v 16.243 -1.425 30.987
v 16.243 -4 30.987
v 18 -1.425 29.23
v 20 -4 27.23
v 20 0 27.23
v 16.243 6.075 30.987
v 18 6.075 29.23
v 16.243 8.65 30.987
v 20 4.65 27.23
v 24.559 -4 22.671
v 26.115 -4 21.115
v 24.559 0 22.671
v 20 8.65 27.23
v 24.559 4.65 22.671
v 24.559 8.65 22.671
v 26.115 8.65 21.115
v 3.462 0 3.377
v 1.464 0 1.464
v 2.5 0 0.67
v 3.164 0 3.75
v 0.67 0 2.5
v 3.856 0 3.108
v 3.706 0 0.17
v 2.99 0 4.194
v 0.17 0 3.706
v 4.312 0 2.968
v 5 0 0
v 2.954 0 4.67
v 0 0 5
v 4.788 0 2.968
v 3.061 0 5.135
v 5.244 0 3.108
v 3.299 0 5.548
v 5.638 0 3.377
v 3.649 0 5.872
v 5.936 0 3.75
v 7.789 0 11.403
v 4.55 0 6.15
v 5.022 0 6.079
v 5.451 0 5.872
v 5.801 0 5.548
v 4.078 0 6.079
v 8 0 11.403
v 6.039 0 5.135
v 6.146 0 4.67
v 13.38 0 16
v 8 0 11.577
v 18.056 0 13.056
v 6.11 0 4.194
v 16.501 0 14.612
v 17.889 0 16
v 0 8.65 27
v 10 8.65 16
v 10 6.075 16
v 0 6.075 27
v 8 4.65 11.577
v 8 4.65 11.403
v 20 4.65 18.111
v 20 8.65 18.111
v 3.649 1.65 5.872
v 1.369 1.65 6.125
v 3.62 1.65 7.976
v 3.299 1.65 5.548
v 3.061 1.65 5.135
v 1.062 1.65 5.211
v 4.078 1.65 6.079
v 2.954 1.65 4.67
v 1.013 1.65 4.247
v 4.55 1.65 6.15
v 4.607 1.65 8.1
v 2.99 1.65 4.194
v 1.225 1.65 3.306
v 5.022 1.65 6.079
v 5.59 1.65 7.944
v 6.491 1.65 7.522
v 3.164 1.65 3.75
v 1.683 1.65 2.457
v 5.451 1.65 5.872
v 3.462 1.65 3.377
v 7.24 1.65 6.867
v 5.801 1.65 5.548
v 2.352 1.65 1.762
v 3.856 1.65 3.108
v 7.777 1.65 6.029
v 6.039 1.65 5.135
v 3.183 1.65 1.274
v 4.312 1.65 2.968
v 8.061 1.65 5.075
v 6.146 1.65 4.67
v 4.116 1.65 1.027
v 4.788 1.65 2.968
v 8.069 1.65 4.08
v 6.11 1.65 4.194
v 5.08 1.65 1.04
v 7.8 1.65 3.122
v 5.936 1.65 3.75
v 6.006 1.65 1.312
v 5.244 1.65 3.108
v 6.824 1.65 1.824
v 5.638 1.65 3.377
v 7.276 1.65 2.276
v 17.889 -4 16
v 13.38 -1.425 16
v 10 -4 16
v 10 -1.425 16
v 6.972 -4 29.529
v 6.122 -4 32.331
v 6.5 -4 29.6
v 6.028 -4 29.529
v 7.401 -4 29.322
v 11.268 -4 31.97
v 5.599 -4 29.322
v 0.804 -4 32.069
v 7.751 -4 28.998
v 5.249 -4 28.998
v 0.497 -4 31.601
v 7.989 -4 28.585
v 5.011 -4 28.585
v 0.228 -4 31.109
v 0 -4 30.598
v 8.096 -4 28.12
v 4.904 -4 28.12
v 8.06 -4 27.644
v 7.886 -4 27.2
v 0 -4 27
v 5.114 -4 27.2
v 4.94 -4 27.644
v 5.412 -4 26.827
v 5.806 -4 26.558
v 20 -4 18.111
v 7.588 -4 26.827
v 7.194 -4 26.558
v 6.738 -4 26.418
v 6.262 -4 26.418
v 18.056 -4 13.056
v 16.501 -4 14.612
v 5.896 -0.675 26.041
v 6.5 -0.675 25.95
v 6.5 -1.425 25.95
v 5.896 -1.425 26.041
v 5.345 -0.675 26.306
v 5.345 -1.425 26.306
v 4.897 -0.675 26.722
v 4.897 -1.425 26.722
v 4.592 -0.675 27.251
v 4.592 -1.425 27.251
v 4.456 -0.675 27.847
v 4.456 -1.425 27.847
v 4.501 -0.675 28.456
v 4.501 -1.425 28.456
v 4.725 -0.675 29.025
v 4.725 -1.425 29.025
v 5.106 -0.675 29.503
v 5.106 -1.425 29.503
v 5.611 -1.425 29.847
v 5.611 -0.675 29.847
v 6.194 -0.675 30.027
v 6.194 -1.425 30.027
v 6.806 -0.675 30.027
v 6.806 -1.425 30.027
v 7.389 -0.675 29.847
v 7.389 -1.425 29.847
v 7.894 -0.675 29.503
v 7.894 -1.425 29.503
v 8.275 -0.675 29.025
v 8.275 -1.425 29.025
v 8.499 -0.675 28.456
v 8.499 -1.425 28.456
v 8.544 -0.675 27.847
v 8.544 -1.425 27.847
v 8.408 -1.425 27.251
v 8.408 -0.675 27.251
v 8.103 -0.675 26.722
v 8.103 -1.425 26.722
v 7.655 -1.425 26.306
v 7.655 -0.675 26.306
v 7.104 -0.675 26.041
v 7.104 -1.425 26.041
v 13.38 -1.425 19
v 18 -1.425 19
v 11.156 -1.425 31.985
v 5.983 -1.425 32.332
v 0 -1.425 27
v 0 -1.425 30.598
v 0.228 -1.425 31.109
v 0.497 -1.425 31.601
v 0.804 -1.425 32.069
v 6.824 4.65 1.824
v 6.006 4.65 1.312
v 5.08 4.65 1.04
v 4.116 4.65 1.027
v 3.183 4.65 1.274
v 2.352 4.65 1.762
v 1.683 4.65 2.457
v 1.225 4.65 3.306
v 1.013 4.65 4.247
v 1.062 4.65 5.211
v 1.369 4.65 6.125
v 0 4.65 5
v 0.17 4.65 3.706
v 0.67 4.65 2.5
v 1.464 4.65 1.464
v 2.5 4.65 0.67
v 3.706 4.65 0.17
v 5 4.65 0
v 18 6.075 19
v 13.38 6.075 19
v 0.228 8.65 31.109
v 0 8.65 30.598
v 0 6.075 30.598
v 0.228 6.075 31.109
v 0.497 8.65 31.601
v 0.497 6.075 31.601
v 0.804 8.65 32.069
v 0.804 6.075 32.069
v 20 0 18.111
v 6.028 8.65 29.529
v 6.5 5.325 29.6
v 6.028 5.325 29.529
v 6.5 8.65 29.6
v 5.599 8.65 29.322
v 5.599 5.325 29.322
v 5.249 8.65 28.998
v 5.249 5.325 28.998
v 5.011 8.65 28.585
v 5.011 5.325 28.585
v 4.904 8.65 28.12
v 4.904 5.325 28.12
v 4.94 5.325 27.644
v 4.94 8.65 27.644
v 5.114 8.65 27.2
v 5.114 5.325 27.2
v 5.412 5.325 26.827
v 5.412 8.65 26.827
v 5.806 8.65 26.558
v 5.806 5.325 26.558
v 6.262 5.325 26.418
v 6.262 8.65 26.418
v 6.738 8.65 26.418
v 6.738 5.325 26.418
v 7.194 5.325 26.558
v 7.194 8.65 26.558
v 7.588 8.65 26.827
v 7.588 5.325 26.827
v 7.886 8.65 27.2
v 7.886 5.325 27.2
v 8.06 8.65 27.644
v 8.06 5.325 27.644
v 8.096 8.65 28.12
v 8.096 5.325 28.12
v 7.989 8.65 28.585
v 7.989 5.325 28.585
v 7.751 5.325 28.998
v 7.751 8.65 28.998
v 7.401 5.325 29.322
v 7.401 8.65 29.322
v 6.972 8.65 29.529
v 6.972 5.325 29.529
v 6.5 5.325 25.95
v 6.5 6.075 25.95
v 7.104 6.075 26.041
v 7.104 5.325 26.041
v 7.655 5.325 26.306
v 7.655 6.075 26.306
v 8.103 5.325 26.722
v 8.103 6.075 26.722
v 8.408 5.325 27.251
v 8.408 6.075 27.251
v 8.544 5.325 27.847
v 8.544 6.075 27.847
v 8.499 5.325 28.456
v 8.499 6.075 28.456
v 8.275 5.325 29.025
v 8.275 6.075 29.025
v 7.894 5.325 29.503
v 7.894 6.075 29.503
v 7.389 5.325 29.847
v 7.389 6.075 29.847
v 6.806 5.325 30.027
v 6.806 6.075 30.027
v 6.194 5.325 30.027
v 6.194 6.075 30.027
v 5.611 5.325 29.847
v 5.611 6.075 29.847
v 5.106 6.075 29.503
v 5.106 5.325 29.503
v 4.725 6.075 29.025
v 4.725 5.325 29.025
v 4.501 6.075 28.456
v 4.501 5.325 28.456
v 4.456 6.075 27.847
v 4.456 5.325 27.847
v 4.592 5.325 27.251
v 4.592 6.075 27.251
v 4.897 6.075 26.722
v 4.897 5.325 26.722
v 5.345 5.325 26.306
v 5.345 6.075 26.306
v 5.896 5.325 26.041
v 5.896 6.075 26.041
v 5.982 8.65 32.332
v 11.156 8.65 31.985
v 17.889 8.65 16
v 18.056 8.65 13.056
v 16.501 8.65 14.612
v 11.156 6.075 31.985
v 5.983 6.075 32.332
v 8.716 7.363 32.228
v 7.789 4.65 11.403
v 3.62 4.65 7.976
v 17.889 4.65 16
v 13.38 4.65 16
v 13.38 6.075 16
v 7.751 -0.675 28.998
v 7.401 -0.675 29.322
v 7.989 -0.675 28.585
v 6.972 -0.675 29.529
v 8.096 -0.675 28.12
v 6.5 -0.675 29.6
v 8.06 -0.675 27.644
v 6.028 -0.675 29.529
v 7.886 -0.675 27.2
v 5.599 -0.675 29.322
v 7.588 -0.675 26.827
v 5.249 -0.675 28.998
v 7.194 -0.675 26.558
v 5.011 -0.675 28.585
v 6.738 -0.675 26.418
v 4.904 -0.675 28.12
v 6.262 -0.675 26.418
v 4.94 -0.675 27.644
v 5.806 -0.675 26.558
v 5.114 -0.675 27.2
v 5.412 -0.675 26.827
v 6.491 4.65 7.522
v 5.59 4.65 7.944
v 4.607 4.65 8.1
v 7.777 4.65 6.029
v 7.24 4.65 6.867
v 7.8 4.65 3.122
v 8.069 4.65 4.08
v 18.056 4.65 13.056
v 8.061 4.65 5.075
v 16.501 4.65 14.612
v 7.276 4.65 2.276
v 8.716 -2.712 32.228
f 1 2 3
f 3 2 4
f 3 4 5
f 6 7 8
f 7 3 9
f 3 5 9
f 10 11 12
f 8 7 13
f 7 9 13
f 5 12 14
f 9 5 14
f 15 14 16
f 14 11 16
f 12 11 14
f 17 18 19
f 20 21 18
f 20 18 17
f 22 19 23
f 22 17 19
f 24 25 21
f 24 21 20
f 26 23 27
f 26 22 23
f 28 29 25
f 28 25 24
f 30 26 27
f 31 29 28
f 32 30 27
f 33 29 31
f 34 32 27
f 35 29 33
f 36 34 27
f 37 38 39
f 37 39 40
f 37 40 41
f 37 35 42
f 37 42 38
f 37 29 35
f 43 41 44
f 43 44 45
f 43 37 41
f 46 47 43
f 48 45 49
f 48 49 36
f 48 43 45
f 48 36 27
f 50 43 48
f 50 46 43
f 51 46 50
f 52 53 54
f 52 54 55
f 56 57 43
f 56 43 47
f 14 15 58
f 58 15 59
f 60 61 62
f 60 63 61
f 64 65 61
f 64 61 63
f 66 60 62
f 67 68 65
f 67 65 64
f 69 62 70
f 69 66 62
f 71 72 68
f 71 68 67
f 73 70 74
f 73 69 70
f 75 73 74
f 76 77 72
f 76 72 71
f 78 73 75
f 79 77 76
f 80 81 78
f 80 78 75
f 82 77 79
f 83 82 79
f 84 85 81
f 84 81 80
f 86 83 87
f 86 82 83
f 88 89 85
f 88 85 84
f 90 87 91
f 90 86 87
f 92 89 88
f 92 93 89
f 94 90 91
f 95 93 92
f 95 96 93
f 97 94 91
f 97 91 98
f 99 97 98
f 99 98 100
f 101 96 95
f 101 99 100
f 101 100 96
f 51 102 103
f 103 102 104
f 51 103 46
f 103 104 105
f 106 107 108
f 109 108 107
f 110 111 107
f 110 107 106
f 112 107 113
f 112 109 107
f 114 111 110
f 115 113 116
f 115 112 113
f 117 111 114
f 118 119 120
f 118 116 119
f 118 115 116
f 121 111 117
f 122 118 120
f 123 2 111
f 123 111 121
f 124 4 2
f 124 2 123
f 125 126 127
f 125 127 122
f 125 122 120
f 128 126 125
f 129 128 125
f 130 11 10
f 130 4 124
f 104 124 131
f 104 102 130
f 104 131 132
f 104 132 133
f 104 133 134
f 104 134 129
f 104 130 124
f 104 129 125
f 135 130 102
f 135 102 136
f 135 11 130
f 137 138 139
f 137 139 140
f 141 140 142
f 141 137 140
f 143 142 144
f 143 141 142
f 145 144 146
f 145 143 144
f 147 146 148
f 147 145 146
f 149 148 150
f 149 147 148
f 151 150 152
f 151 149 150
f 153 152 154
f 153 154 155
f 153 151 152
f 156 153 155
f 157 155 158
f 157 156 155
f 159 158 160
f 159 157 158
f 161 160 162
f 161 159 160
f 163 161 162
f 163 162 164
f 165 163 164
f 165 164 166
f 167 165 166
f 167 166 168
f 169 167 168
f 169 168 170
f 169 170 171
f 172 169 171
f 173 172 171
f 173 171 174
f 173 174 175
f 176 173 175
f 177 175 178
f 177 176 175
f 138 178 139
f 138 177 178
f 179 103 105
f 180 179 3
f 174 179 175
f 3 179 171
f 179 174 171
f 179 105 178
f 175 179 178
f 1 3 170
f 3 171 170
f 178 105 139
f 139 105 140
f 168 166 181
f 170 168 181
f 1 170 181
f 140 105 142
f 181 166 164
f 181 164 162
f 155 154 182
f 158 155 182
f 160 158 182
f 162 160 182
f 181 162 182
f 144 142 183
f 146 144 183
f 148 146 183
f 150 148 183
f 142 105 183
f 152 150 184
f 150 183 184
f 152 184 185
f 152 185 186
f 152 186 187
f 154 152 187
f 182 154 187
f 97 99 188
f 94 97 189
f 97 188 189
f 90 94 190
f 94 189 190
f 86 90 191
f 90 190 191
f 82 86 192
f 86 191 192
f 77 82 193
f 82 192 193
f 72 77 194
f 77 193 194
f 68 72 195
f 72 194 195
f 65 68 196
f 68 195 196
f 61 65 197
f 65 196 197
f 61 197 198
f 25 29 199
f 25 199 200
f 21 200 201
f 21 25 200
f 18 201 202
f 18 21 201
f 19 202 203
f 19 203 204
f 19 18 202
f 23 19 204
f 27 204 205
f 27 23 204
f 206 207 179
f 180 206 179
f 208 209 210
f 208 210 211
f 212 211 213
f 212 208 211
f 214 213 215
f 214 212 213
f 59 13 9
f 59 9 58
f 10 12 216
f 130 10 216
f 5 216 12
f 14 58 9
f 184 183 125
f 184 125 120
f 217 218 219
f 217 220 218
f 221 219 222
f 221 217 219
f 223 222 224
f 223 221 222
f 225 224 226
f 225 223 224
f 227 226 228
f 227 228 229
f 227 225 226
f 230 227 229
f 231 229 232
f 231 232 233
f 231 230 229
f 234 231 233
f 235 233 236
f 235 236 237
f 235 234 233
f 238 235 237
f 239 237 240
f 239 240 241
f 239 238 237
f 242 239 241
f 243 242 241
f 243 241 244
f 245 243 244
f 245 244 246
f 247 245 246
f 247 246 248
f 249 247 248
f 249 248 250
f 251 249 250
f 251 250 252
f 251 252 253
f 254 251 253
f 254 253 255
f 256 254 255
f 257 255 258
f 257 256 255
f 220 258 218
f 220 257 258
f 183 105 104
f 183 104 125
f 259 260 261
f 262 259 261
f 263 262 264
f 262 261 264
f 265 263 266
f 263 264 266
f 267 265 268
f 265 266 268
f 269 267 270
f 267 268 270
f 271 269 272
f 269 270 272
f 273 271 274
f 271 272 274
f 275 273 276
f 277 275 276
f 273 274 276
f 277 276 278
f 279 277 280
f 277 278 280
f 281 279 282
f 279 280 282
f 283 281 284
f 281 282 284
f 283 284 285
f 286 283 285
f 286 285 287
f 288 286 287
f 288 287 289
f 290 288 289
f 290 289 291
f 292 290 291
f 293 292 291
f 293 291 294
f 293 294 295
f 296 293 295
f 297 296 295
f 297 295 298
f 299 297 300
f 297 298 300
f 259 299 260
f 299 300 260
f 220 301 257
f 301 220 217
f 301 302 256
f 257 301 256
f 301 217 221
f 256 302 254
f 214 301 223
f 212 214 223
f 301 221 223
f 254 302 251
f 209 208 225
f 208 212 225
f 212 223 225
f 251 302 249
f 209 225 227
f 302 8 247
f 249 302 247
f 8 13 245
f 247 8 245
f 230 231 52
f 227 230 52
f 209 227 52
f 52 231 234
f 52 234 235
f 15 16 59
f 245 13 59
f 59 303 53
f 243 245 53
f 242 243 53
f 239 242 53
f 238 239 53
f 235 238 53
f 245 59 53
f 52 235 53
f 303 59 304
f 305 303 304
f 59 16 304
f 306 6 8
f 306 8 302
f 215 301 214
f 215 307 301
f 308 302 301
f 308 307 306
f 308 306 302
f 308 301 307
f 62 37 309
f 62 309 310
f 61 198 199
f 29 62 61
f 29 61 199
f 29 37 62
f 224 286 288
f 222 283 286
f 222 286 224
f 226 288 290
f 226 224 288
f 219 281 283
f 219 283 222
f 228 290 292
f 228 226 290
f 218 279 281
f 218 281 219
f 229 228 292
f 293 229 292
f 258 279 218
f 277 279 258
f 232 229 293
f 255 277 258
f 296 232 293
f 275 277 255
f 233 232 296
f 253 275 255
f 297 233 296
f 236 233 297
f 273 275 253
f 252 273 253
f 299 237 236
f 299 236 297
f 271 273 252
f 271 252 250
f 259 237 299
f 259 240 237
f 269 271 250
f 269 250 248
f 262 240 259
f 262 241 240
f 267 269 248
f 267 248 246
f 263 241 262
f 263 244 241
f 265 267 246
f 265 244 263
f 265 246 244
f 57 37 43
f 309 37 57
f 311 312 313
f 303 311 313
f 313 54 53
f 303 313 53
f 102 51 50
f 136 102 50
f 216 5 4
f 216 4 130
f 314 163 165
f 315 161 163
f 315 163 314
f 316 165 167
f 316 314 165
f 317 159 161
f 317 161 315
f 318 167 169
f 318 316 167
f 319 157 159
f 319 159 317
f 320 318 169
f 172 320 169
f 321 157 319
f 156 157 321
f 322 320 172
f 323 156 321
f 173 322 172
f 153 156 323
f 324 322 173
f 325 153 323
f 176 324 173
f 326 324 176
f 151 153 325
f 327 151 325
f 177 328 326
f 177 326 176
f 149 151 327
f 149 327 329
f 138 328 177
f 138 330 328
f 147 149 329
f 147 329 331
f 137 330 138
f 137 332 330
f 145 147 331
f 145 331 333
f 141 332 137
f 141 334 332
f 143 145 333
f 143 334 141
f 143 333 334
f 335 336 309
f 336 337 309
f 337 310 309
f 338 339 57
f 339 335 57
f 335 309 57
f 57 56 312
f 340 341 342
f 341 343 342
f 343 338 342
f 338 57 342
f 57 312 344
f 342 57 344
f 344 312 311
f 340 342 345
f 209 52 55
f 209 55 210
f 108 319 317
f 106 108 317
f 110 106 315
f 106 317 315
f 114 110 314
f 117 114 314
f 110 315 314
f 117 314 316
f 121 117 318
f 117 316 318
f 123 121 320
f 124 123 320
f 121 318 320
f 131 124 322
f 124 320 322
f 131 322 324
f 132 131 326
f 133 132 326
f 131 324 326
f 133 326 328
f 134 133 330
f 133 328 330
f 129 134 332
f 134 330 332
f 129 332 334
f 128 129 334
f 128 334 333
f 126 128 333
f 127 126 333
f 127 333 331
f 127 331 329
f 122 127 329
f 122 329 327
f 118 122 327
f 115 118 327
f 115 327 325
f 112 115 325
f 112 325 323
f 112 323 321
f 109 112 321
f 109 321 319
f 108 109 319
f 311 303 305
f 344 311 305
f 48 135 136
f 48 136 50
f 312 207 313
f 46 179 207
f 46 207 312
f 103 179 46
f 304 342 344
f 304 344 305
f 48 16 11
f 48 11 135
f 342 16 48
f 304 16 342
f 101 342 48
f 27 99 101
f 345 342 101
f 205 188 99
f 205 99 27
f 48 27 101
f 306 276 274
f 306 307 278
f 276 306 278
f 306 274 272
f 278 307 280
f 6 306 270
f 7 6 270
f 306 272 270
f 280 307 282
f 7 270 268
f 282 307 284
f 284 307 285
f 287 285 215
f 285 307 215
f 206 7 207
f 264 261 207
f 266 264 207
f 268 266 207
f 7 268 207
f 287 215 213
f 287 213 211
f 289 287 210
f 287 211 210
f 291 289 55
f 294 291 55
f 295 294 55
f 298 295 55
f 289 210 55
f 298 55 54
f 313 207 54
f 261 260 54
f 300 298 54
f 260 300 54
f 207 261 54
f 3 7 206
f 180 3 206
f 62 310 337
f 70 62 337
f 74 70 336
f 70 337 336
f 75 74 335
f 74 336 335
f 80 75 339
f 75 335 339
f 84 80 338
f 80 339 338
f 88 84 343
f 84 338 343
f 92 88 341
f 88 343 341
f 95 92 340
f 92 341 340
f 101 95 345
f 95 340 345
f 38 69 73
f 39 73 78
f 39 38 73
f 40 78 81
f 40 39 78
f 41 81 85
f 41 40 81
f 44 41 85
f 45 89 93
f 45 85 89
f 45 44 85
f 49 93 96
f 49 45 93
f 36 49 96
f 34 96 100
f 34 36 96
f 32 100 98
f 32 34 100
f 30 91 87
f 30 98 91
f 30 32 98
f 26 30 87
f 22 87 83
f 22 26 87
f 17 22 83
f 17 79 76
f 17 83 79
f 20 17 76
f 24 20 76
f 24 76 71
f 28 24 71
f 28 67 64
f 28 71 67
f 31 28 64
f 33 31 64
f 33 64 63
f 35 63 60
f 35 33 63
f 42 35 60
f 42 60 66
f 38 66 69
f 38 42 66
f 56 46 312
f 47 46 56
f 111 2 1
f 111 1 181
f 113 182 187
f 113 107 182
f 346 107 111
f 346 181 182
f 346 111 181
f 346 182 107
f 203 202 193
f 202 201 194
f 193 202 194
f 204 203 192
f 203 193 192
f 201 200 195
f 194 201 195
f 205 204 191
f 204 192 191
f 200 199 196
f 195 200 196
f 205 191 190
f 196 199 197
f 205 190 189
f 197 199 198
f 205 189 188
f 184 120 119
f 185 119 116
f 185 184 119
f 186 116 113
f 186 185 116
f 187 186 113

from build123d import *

# Parameters (mm, degrees)
SKETCH_1_R           = 1.6
EXTRUDE_1_DEPTH      = 4.65
SKETCH_7_W           = 9
SKETCH_7_H           = 19
EXTRUDE_4_DEPTH      = 4
SKETCH_8_W           = 9
SKETCH_8_H           = 19
EXTRUDE_5_DEPTH      = 4
SKETCH_9_W           = 16
SKETCH_9_H           = 7.5
CUT_EXTRUDE_3_DEPTH  = 9
SKETCH_11_R          = 1.6
CUT_EXTRUDE_5_DEPTH  = 26.4
EXTRUDE_6_DEPTH      = 9
SKETCH_13_W          = 19
SKETCH_13_H          = 12.65
EXTRUDE_7_DEPTH      = 2
SKETCH_15_W          = 7.596607022
SKETCH_15_H          = 7.5
CUT_EXTRUDE_6_DEPTH  = 8
CUT_EXTRUDE_7_DEPTH  = 8
EXTRUDE_8_DEPTH      = 4.65
CUT_EXTRUDE_9_DEPTH  = 4.65
SKETCH_20_W          = 5.380169682
SKETCH_20_H          = 3
CUT_EXTRUDE_10_DEPTH = 7.5
CUT_EXTRUDE_11_DEPTH = 4.65
CUT_EXTRUDE_13_DEPTH = 13
CUT_EXTRUDE_15_DEPTH = 13
SKETCH_26_W          = 18.396488504
SKETCH_26_H          = 12.65
EXTRUDE_9_DEPTH      = 2.2
SKETCH_28_W          = 2.5
SKETCH_28_H          = 12.65
CUT_EXTRUDE_17_DEPTH = 18
CUT_EXTRUDE_18_DEPTH = 14
SKETCH_31_W          = 5
SKETCH_31_H          = 12.65
CUT_EXTRUDE_19_DEPTH = 20
SKETCH_32_R          = 3.55
CUT_EXTRUDE_20_DEPTH = 3
EXTRUDE_START        = 0.75
SKETCH_33_R          = 2.05
SKETCH_33_R_2        = 1.6
EXTRUDE_10_DEPTH     = 0.75
SKETCH_34_R          = 2.05
SKETCH_34_R_2        = 1.6
EXTRUDE_11_DEPTH     = 0.75


with BuildPart() as part:
    # 草图1 → 凸台-拉伸1 (new body)
    with BuildSketch(Plane(origin=(0, 0, 0), x_dir=(1, 0, 0), z_dir=(0, 1, 0))):
        with BuildLine():
            Line((5, 0), (20, 0))
            Line((20, 0), (20, -16))
            Line((20, -16), (9, -16))
            Line((9, -16), (9, -35))
            Line((9, -35), (0, -35))
            Line((0, -35), (0, -27))
            Line((0, -27), (0, -5))
            ThreePointArc((0, -5), (1.464466094, -1.464466094), (5, 0))
        make_face()
        with Locations(Location((4.55, -4.55, 0), (0, 0, 270))):
            Circle(SKETCH_1_R, mode=Mode.SUBTRACT)
    extrude(amount=EXTRUDE_1_DEPTH)

    # 草图7 → 凸台-拉伸4 (add)
    with BuildSketch(Plane(origin=(0, 4.65, 0), x_dir=(1, 0, 0), z_dir=(0, 1, 0))):
        with Locations((4.5, -25.5)):
            Rectangle(SKETCH_7_W, SKETCH_7_H)
    extrude(amount=EXTRUDE_4_DEPTH)

    # 草图8 → 凸台-拉伸5 (add)
    with BuildSketch(Plane.XZ):
        with Locations((4.5, 25.5)):
            Rectangle(SKETCH_8_W, SKETCH_8_H)
    extrude(amount=EXTRUDE_5_DEPTH)

    # 草图9 → 切除-拉伸3 (cut)
    with BuildSketch(Plane.ZY):
        with Locations((27, 2.325)):
            Rectangle(SKETCH_9_W, SKETCH_9_H)
    extrude(amount=-CUT_EXTRUDE_3_DEPTH, mode=Mode.SUBTRACT)

    # 草图11 → 切除-拉伸5 (cut)
    with BuildSketch(Plane(origin=(0, 8.65, 0), x_dir=(1, 0, 0), z_dir=(0, 1, 0))):
        with Locations(Location((6.5, -28, 0), (0, 0, 270))):
            Circle(SKETCH_11_R)
    extrude(amount=-CUT_EXTRUDE_5_DEPTH, mode=Mode.SUBTRACT)

    # 草图12 → 凸台-拉伸6 (add)
    with BuildSketch(Plane(origin=(9, 0, 0), x_dir=(0, 0, -1), z_dir=(1, 0, 0))):
        Polygon((-35, 8.65), (-35, 6.075), (-19, 6.075), (-19, -1.425), (-35, -1.425), (-35, -4), (-16, -4), (-16, 8.65), align=None)
    extrude(amount=EXTRUDE_6_DEPTH)

    # 草图13 → 凸台-拉伸7 (add)
    with BuildSketch(Plane(origin=(18, 0, 0), x_dir=(0, 0, -1), z_dir=(1, 0, 0))):
        with Locations((-25.5, 2.325)):
            Rectangle(SKETCH_13_W, SKETCH_13_H)
    extrude(amount=EXTRUDE_7_DEPTH)

    # 草图15 → 切除-拉伸6 (cut)
    with BuildSketch(Plane.ZY):
        with Locations((15.201696489, 2.325)):
            Rectangle(SKETCH_15_W, SKETCH_15_H)
    extrude(amount=-CUT_EXTRUDE_6_DEPTH, mode=Mode.SUBTRACT)

    # 草图16 → 切除-拉伸7 (cut)
    with BuildSketch(Plane(origin=(0, 4.65, 0), x_dir=(1, 0, 0), z_dir=(0, 1, 0))):
        Polygon((0, -5), (5.890898071, -11.403392978), (0, -11.403392978), align=None)
    extrude(amount=-CUT_EXTRUDE_7_DEPTH, mode=Mode.SUBTRACT)

    # 草图17 → 凸台-拉伸8 (add)
    with BuildSketch(Plane.XZ):
        with BuildLine():
            Line((20, 35), (20, 15))
            Line((20, 15), (31.064630957, 26.064630957))
            ThreePointArc((31.064630957, 26.064630957), (26.002686727, 31.114774273), (20, 35))
        make_face()
    extrude(amount=-EXTRUDE_8_DEPTH)

    # 草图19 → 切除-拉伸9 (cut)
    with BuildSketch(Plane(origin=(0, 4.65, 0), x_dir=(1, 0, 0), z_dir=(0, 1, 0))):
        Polygon((20, -15), (5, 0), (20, 0), align=None)
    extrude(amount=-CUT_EXTRUDE_9_DEPTH, mode=Mode.SUBTRACT)

    # 草图20 → 切除-拉伸10 (cut)
    with BuildSketch(Plane(origin=(0, -1.425, 0), x_dir=(1, 0, 0), z_dir=(0, 1, 0))):
        with Locations((10.690084841, -17.5)):
            Rectangle(SKETCH_20_W, SKETCH_20_H)
    extrude(amount=CUT_EXTRUDE_10_DEPTH, mode=Mode.SUBTRACT)

    # 草图21 → 切除-拉伸11 (cut)
    with BuildSketch(Plane.XZ):
        Polygon((13.380169682, 16), (0, 5), (8, 16), align=None)
    extrude(amount=-CUT_EXTRUDE_11_DEPTH, mode=Mode.SUBTRACT)

    # 草图22 → 切除-拉伸13 (cut)
    with BuildSketch(Plane(origin=(0, 8.65, 0), x_dir=(1, 0, 0), z_dir=(0, 1, 0))):
        Polygon((0, -16), (10, -16), (0, -27), align=None)
    extrude(amount=-CUT_EXTRUDE_13_DEPTH, mode=Mode.SUBTRACT)

    # 草图23 → 切除-拉伸15 (cut)
    with BuildSketch(Plane(origin=(0, 8.65, 0), x_dir=(1, 0, 0), z_dir=(0, 1, 0))):
        with BuildLine():
            Line((6.5, -35), (0, -35))
            Line((0, -35), (0, -30.598076211))
            ThreePointArc((0, -30.598076211), (2.574858823, -33.79596987), (6.5, -35))
        make_face()
    extrude(amount=-CUT_EXTRUDE_15_DEPTH, mode=Mode.SUBTRACT)

    # 草图26 → 凸台-拉伸9 (add)
    with BuildSketch(Plane(origin=(2.5, 0, -2.5), x_dir=(-0.7071067811865509, 0, -0.7071067811865442), z_dir=(0.7071067811865442, 0, -0.7071067811865509))):
        with Locations((-31.198244252, 2.325)):
            Rectangle(SKETCH_26_W, SKETCH_26_H)
    extrude(amount=-EXTRUDE_9_DEPTH)

    # 草图28 → 切除-拉伸17 (cut)
    with BuildSketch(Plane(origin=(2.5, 0, -2.5), x_dir=(-0.7071067811865509, 0, -0.7071067811865442), z_dir=(0.7071067811865442, 0, -0.7071067811865509))):
        with Locations((-39.646488504, 2.325)):
            Rectangle(SKETCH_28_W, SKETCH_28_H)
    extrude(amount=-CUT_EXTRUDE_17_DEPTH, mode=Mode.SUBTRACT)

    # 草图29 → 切除-拉伸18 (cut)
    with BuildSketch(Plane.XZ.offset(4)):
        with BuildLine():
            Line((29.650417395, 24.650417395), (19.300834789, 35))
            Line((19.300834789, 35), (1.773611639, 35))
            Line((1.773611639, 35), (0.803925841, 32.06875155))
            add(Edge.make_bspline(
                [(29.650417395, 24.650417395), (16.711479186, 33.756910479), (0.803925841, 32.06875155)],
                knots=[0, 0, 0, 1, 1, 1], degree=2))
        make_face()
    extrude(amount=-CUT_EXTRUDE_18_DEPTH, mode=Mode.SUBTRACT)

    # 草图31 → 切除-拉伸19 (cut)
    with BuildSketch(Plane(origin=(2.5, 0, -2.5), x_dir=(-0.7071067811865509, 0, -0.7071067811865442), z_dir=(0.7071067811865442, 0, -0.7071067811865509))):
        with Locations((-35.896488504, 2.325)):
            Rectangle(SKETCH_31_W, SKETCH_31_H)
    extrude(amount=-CUT_EXTRUDE_19_DEPTH, mode=Mode.SUBTRACT)

    # 草图32 → 切除-拉伸20 (cut)
    with BuildSketch(Plane(origin=(0, 4.65, 0), x_dir=(1, 0, 0), z_dir=(0, 1, 0))):
        with Locations((4.55, -4.55)):
            Circle(SKETCH_32_R)
    extrude(amount=-CUT_EXTRUDE_20_DEPTH, mode=Mode.SUBTRACT)

    # 草图33 → 凸台-拉伸10 (add)
    with BuildSketch(Plane(origin=(0, -1.425, 0), x_dir=(1, 0, 0), z_dir=(0, 1, 0)).offset(EXTRUDE_START)):
        with Locations(Location((6.5, -28, 0), (0, 0, 90))):
            Circle(SKETCH_33_R)
        with Locations(Location((6.5, -28, 0), (0, 0, 270))):
            Circle(SKETCH_33_R_2, mode=Mode.SUBTRACT)
    extrude(amount=-EXTRUDE_10_DEPTH)

    # 草图34 → 凸台-拉伸11 (add)
    with BuildSketch(Plane.XZ.offset(-6.075)):
        with Locations(Location((6.5, 28, 0), (0, 0, 270))):
            Circle(SKETCH_34_R)
        with Locations(Location((6.5, 28, 0), (0, 0, 90))):
            Circle(SKETCH_34_R_2, mode=Mode.SUBTRACT)
    extrude(amount=EXTRUDE_11_DEPTH)


solid = part.part
